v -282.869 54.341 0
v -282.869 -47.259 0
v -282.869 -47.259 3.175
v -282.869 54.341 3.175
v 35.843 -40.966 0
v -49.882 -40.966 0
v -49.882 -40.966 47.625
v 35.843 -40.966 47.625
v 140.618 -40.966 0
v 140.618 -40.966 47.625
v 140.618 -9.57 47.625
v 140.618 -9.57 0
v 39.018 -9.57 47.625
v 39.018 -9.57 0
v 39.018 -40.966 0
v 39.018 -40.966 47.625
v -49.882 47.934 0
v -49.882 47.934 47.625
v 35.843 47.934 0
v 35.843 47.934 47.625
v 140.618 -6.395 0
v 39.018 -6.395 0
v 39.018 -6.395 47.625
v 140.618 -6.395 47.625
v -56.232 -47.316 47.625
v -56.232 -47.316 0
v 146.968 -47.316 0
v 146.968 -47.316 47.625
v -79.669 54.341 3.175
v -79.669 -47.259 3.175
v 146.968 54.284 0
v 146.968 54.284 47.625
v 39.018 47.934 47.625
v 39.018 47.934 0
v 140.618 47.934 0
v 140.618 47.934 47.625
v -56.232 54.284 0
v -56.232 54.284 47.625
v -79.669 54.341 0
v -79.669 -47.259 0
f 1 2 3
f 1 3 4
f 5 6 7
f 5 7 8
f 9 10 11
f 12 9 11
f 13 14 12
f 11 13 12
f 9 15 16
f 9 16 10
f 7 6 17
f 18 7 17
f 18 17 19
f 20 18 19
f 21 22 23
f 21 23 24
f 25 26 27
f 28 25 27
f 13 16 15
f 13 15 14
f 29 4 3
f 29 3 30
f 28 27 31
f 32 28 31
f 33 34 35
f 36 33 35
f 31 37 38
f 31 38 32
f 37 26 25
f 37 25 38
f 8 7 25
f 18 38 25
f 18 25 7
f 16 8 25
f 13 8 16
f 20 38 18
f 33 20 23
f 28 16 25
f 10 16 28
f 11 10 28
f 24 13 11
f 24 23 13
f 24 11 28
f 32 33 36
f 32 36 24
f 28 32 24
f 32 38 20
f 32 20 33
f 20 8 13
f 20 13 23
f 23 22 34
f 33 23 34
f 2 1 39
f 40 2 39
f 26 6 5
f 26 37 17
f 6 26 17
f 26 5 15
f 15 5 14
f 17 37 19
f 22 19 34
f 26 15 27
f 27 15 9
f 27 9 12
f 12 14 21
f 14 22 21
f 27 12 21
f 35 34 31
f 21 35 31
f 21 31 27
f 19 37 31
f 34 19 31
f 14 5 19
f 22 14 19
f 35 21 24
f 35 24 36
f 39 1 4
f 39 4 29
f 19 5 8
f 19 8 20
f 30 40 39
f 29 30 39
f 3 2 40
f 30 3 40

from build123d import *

# Parameters (mm, degrees)
F0_W     = 203.2
F0_H     = 101.6
F1_DEPTH = 3.175
F0_W_2   = 101.6
F0_H_2   = 31.395693
F0_W_3   = 85.725
F0_H_3   = 88.9
F0_H_4   = 54.329307
F2_DEPTH = 47.625


with BuildPart() as f1:
    # F0 (on Top) → F1 (new body)
    with BuildSketch(Plane.XY):
        with Locations((-181.269043, 3.540572)):
            Rectangle(F0_W, F0_H)
    extrude(amount=F1_DEPTH)


with BuildPart() as f2:
    # F0 (on Top) → F2 (new body)
    with BuildSketch(Plane.XY):
        with Locations((45.367662, 3.483918)):
            Rectangle(F0_W, F0_H)
        with Locations((89.817662, -25.268235)):
            Rectangle(F0_W_2, F0_H_2, mode=Mode.SUBTRACT)
        with Locations((-7.019838, 3.483918)):
            Rectangle(F0_W_3, F0_H_3, mode=Mode.SUBTRACT)
        with Locations((89.817662, 20.769264)):
            Rectangle(F0_W_2, F0_H_4, mode=Mode.SUBTRACT)
    extrude(amount=F2_DEPTH)


solid = Compound([f1.part, f2.part])
